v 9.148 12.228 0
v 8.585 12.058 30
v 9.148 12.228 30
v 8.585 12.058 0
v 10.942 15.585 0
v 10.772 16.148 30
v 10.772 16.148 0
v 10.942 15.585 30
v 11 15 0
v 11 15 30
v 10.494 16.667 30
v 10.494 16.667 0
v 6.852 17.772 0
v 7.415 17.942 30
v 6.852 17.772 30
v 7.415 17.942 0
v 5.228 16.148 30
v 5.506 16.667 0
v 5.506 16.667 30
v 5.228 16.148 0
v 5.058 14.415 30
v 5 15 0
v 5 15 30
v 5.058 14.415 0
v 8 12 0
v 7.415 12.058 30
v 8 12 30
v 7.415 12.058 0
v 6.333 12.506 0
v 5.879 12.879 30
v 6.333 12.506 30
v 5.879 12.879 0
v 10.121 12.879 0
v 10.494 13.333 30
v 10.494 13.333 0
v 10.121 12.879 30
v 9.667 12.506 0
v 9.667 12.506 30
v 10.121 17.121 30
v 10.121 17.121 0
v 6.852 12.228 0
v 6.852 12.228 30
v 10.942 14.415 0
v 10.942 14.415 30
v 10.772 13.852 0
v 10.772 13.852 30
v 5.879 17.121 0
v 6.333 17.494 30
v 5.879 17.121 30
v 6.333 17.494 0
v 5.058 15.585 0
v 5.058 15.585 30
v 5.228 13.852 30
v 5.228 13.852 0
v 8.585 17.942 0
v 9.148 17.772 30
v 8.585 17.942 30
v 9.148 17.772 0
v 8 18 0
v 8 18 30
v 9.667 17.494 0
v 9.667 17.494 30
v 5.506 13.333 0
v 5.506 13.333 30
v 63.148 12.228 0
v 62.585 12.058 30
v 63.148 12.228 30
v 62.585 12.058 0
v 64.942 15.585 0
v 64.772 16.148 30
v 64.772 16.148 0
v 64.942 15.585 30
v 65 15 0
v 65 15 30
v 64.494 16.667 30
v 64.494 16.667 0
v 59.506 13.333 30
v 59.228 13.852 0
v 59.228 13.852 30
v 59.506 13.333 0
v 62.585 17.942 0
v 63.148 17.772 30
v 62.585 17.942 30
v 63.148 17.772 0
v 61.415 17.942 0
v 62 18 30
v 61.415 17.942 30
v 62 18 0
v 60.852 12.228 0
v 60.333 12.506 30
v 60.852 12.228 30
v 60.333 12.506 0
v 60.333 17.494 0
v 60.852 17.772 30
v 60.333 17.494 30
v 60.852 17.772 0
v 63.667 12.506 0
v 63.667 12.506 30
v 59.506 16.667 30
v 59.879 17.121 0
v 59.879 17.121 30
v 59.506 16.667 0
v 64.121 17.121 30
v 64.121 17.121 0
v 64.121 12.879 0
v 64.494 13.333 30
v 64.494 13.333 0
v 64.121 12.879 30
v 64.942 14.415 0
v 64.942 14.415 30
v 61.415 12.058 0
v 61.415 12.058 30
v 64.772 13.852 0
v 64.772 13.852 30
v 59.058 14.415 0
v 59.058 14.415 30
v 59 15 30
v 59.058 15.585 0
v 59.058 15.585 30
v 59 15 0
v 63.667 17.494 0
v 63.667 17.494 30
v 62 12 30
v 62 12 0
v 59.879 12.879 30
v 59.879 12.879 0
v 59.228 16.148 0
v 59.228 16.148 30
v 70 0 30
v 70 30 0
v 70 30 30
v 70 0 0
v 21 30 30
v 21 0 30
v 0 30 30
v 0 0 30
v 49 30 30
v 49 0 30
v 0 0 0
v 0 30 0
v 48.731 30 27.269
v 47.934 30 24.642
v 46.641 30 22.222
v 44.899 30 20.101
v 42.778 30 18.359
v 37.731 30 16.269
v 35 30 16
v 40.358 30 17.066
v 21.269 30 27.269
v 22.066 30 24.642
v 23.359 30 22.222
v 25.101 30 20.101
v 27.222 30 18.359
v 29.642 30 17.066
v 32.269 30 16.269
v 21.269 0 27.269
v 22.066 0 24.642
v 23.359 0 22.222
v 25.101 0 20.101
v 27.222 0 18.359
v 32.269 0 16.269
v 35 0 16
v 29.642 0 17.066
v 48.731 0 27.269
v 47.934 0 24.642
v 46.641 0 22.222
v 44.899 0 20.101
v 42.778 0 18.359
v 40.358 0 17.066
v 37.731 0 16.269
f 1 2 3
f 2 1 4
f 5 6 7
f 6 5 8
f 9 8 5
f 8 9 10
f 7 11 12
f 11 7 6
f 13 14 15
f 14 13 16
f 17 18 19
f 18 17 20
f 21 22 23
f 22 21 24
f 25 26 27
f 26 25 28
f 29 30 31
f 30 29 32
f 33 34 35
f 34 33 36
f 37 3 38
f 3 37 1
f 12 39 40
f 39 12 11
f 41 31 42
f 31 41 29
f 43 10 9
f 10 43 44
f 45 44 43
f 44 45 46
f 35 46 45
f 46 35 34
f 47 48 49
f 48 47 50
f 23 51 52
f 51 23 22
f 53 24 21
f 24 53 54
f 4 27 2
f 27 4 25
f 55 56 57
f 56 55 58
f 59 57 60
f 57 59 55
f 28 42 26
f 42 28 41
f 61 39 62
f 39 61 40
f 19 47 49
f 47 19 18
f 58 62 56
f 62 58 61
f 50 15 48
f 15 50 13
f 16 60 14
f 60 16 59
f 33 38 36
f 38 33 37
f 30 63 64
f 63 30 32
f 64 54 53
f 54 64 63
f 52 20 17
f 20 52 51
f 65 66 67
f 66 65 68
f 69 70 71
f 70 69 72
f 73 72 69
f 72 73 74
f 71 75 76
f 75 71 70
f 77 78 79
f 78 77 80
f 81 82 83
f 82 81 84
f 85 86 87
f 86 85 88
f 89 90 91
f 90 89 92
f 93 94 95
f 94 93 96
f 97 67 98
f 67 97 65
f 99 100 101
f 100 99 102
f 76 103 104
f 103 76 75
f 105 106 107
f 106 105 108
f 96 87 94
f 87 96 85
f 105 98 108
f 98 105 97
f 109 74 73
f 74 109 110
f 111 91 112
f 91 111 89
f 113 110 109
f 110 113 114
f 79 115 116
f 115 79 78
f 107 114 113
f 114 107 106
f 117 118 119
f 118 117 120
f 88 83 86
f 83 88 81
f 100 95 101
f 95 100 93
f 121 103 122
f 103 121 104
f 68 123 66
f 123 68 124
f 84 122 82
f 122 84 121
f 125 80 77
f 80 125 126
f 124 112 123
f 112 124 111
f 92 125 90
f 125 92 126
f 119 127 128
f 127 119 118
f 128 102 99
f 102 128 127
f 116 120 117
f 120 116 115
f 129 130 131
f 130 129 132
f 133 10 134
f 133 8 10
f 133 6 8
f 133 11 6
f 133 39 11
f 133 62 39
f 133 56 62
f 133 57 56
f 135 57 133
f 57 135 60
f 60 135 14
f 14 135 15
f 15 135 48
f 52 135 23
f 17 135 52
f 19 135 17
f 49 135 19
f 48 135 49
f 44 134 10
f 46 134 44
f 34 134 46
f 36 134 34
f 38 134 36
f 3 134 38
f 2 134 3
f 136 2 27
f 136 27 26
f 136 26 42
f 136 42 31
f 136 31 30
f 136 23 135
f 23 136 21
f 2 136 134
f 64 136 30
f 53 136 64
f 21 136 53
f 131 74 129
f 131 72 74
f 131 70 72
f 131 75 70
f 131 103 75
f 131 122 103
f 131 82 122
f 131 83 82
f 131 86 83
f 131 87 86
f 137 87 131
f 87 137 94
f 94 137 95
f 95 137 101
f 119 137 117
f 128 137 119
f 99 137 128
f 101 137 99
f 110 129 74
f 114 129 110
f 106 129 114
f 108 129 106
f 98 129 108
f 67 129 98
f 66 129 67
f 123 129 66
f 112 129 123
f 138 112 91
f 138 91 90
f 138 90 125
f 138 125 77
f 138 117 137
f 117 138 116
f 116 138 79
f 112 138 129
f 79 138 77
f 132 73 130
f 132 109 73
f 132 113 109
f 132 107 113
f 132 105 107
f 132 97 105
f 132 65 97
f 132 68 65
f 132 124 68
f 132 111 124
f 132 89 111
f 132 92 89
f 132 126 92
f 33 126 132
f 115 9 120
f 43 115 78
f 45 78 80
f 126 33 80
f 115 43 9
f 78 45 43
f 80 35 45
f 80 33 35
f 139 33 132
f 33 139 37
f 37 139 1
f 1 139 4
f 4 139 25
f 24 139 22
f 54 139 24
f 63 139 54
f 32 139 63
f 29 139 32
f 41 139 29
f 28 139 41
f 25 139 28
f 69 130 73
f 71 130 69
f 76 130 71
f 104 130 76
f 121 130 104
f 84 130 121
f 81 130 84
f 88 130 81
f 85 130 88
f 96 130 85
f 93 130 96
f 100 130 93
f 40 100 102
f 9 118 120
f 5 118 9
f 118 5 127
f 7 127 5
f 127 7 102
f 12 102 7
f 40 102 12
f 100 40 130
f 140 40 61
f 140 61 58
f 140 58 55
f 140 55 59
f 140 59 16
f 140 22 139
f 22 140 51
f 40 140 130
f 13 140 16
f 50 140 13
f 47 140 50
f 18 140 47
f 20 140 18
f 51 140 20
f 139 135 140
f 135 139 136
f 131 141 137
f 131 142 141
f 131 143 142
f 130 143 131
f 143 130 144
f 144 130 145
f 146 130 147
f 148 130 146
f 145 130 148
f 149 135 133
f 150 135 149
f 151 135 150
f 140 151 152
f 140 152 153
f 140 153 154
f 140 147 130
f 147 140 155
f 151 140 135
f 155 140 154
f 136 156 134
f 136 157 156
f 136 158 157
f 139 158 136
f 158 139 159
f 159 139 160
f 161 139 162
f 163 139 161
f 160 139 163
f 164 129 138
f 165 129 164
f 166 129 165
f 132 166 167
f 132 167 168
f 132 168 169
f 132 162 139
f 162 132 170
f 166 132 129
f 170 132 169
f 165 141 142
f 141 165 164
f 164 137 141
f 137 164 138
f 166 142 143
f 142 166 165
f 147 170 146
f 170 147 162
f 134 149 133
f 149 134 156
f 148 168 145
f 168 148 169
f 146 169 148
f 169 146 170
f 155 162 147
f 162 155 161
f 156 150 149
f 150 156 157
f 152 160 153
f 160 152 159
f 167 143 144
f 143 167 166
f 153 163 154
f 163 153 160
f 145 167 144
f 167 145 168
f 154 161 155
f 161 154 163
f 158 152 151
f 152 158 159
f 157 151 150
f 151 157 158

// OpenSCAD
$fn = 32;

// ----------------------------------------------------------------------
// Saddle clamp: plain shaft clamp
// ----------------------------------------------------------------------

// --- parameters (mm) ---
blk_l = 70;               // block length, X
blk_w = 30;               // block width, Y
blk_h = 30;               // block height
clamp_r = 14;             // shaft groove radius
hole_r = 3;               // bolt hole radius
hole_m = 8;               // bolt hole margin from the ends

saw_depth = clamp_r + 3;  // saw kerf depth

difference() {
  cube([blk_l, blk_w, blk_h]);
  translate([blk_l / 2, -1, blk_h])
    rotate([-90, 0, 0])
      cylinder(h = blk_w + 2, r = clamp_r);
  for (sx = [0, 1])
    translate([sx ? blk_l - hole_m : hole_m, blk_w / 2, -1])
      cylinder(r = hole_r, h = blk_h + 2);
}
